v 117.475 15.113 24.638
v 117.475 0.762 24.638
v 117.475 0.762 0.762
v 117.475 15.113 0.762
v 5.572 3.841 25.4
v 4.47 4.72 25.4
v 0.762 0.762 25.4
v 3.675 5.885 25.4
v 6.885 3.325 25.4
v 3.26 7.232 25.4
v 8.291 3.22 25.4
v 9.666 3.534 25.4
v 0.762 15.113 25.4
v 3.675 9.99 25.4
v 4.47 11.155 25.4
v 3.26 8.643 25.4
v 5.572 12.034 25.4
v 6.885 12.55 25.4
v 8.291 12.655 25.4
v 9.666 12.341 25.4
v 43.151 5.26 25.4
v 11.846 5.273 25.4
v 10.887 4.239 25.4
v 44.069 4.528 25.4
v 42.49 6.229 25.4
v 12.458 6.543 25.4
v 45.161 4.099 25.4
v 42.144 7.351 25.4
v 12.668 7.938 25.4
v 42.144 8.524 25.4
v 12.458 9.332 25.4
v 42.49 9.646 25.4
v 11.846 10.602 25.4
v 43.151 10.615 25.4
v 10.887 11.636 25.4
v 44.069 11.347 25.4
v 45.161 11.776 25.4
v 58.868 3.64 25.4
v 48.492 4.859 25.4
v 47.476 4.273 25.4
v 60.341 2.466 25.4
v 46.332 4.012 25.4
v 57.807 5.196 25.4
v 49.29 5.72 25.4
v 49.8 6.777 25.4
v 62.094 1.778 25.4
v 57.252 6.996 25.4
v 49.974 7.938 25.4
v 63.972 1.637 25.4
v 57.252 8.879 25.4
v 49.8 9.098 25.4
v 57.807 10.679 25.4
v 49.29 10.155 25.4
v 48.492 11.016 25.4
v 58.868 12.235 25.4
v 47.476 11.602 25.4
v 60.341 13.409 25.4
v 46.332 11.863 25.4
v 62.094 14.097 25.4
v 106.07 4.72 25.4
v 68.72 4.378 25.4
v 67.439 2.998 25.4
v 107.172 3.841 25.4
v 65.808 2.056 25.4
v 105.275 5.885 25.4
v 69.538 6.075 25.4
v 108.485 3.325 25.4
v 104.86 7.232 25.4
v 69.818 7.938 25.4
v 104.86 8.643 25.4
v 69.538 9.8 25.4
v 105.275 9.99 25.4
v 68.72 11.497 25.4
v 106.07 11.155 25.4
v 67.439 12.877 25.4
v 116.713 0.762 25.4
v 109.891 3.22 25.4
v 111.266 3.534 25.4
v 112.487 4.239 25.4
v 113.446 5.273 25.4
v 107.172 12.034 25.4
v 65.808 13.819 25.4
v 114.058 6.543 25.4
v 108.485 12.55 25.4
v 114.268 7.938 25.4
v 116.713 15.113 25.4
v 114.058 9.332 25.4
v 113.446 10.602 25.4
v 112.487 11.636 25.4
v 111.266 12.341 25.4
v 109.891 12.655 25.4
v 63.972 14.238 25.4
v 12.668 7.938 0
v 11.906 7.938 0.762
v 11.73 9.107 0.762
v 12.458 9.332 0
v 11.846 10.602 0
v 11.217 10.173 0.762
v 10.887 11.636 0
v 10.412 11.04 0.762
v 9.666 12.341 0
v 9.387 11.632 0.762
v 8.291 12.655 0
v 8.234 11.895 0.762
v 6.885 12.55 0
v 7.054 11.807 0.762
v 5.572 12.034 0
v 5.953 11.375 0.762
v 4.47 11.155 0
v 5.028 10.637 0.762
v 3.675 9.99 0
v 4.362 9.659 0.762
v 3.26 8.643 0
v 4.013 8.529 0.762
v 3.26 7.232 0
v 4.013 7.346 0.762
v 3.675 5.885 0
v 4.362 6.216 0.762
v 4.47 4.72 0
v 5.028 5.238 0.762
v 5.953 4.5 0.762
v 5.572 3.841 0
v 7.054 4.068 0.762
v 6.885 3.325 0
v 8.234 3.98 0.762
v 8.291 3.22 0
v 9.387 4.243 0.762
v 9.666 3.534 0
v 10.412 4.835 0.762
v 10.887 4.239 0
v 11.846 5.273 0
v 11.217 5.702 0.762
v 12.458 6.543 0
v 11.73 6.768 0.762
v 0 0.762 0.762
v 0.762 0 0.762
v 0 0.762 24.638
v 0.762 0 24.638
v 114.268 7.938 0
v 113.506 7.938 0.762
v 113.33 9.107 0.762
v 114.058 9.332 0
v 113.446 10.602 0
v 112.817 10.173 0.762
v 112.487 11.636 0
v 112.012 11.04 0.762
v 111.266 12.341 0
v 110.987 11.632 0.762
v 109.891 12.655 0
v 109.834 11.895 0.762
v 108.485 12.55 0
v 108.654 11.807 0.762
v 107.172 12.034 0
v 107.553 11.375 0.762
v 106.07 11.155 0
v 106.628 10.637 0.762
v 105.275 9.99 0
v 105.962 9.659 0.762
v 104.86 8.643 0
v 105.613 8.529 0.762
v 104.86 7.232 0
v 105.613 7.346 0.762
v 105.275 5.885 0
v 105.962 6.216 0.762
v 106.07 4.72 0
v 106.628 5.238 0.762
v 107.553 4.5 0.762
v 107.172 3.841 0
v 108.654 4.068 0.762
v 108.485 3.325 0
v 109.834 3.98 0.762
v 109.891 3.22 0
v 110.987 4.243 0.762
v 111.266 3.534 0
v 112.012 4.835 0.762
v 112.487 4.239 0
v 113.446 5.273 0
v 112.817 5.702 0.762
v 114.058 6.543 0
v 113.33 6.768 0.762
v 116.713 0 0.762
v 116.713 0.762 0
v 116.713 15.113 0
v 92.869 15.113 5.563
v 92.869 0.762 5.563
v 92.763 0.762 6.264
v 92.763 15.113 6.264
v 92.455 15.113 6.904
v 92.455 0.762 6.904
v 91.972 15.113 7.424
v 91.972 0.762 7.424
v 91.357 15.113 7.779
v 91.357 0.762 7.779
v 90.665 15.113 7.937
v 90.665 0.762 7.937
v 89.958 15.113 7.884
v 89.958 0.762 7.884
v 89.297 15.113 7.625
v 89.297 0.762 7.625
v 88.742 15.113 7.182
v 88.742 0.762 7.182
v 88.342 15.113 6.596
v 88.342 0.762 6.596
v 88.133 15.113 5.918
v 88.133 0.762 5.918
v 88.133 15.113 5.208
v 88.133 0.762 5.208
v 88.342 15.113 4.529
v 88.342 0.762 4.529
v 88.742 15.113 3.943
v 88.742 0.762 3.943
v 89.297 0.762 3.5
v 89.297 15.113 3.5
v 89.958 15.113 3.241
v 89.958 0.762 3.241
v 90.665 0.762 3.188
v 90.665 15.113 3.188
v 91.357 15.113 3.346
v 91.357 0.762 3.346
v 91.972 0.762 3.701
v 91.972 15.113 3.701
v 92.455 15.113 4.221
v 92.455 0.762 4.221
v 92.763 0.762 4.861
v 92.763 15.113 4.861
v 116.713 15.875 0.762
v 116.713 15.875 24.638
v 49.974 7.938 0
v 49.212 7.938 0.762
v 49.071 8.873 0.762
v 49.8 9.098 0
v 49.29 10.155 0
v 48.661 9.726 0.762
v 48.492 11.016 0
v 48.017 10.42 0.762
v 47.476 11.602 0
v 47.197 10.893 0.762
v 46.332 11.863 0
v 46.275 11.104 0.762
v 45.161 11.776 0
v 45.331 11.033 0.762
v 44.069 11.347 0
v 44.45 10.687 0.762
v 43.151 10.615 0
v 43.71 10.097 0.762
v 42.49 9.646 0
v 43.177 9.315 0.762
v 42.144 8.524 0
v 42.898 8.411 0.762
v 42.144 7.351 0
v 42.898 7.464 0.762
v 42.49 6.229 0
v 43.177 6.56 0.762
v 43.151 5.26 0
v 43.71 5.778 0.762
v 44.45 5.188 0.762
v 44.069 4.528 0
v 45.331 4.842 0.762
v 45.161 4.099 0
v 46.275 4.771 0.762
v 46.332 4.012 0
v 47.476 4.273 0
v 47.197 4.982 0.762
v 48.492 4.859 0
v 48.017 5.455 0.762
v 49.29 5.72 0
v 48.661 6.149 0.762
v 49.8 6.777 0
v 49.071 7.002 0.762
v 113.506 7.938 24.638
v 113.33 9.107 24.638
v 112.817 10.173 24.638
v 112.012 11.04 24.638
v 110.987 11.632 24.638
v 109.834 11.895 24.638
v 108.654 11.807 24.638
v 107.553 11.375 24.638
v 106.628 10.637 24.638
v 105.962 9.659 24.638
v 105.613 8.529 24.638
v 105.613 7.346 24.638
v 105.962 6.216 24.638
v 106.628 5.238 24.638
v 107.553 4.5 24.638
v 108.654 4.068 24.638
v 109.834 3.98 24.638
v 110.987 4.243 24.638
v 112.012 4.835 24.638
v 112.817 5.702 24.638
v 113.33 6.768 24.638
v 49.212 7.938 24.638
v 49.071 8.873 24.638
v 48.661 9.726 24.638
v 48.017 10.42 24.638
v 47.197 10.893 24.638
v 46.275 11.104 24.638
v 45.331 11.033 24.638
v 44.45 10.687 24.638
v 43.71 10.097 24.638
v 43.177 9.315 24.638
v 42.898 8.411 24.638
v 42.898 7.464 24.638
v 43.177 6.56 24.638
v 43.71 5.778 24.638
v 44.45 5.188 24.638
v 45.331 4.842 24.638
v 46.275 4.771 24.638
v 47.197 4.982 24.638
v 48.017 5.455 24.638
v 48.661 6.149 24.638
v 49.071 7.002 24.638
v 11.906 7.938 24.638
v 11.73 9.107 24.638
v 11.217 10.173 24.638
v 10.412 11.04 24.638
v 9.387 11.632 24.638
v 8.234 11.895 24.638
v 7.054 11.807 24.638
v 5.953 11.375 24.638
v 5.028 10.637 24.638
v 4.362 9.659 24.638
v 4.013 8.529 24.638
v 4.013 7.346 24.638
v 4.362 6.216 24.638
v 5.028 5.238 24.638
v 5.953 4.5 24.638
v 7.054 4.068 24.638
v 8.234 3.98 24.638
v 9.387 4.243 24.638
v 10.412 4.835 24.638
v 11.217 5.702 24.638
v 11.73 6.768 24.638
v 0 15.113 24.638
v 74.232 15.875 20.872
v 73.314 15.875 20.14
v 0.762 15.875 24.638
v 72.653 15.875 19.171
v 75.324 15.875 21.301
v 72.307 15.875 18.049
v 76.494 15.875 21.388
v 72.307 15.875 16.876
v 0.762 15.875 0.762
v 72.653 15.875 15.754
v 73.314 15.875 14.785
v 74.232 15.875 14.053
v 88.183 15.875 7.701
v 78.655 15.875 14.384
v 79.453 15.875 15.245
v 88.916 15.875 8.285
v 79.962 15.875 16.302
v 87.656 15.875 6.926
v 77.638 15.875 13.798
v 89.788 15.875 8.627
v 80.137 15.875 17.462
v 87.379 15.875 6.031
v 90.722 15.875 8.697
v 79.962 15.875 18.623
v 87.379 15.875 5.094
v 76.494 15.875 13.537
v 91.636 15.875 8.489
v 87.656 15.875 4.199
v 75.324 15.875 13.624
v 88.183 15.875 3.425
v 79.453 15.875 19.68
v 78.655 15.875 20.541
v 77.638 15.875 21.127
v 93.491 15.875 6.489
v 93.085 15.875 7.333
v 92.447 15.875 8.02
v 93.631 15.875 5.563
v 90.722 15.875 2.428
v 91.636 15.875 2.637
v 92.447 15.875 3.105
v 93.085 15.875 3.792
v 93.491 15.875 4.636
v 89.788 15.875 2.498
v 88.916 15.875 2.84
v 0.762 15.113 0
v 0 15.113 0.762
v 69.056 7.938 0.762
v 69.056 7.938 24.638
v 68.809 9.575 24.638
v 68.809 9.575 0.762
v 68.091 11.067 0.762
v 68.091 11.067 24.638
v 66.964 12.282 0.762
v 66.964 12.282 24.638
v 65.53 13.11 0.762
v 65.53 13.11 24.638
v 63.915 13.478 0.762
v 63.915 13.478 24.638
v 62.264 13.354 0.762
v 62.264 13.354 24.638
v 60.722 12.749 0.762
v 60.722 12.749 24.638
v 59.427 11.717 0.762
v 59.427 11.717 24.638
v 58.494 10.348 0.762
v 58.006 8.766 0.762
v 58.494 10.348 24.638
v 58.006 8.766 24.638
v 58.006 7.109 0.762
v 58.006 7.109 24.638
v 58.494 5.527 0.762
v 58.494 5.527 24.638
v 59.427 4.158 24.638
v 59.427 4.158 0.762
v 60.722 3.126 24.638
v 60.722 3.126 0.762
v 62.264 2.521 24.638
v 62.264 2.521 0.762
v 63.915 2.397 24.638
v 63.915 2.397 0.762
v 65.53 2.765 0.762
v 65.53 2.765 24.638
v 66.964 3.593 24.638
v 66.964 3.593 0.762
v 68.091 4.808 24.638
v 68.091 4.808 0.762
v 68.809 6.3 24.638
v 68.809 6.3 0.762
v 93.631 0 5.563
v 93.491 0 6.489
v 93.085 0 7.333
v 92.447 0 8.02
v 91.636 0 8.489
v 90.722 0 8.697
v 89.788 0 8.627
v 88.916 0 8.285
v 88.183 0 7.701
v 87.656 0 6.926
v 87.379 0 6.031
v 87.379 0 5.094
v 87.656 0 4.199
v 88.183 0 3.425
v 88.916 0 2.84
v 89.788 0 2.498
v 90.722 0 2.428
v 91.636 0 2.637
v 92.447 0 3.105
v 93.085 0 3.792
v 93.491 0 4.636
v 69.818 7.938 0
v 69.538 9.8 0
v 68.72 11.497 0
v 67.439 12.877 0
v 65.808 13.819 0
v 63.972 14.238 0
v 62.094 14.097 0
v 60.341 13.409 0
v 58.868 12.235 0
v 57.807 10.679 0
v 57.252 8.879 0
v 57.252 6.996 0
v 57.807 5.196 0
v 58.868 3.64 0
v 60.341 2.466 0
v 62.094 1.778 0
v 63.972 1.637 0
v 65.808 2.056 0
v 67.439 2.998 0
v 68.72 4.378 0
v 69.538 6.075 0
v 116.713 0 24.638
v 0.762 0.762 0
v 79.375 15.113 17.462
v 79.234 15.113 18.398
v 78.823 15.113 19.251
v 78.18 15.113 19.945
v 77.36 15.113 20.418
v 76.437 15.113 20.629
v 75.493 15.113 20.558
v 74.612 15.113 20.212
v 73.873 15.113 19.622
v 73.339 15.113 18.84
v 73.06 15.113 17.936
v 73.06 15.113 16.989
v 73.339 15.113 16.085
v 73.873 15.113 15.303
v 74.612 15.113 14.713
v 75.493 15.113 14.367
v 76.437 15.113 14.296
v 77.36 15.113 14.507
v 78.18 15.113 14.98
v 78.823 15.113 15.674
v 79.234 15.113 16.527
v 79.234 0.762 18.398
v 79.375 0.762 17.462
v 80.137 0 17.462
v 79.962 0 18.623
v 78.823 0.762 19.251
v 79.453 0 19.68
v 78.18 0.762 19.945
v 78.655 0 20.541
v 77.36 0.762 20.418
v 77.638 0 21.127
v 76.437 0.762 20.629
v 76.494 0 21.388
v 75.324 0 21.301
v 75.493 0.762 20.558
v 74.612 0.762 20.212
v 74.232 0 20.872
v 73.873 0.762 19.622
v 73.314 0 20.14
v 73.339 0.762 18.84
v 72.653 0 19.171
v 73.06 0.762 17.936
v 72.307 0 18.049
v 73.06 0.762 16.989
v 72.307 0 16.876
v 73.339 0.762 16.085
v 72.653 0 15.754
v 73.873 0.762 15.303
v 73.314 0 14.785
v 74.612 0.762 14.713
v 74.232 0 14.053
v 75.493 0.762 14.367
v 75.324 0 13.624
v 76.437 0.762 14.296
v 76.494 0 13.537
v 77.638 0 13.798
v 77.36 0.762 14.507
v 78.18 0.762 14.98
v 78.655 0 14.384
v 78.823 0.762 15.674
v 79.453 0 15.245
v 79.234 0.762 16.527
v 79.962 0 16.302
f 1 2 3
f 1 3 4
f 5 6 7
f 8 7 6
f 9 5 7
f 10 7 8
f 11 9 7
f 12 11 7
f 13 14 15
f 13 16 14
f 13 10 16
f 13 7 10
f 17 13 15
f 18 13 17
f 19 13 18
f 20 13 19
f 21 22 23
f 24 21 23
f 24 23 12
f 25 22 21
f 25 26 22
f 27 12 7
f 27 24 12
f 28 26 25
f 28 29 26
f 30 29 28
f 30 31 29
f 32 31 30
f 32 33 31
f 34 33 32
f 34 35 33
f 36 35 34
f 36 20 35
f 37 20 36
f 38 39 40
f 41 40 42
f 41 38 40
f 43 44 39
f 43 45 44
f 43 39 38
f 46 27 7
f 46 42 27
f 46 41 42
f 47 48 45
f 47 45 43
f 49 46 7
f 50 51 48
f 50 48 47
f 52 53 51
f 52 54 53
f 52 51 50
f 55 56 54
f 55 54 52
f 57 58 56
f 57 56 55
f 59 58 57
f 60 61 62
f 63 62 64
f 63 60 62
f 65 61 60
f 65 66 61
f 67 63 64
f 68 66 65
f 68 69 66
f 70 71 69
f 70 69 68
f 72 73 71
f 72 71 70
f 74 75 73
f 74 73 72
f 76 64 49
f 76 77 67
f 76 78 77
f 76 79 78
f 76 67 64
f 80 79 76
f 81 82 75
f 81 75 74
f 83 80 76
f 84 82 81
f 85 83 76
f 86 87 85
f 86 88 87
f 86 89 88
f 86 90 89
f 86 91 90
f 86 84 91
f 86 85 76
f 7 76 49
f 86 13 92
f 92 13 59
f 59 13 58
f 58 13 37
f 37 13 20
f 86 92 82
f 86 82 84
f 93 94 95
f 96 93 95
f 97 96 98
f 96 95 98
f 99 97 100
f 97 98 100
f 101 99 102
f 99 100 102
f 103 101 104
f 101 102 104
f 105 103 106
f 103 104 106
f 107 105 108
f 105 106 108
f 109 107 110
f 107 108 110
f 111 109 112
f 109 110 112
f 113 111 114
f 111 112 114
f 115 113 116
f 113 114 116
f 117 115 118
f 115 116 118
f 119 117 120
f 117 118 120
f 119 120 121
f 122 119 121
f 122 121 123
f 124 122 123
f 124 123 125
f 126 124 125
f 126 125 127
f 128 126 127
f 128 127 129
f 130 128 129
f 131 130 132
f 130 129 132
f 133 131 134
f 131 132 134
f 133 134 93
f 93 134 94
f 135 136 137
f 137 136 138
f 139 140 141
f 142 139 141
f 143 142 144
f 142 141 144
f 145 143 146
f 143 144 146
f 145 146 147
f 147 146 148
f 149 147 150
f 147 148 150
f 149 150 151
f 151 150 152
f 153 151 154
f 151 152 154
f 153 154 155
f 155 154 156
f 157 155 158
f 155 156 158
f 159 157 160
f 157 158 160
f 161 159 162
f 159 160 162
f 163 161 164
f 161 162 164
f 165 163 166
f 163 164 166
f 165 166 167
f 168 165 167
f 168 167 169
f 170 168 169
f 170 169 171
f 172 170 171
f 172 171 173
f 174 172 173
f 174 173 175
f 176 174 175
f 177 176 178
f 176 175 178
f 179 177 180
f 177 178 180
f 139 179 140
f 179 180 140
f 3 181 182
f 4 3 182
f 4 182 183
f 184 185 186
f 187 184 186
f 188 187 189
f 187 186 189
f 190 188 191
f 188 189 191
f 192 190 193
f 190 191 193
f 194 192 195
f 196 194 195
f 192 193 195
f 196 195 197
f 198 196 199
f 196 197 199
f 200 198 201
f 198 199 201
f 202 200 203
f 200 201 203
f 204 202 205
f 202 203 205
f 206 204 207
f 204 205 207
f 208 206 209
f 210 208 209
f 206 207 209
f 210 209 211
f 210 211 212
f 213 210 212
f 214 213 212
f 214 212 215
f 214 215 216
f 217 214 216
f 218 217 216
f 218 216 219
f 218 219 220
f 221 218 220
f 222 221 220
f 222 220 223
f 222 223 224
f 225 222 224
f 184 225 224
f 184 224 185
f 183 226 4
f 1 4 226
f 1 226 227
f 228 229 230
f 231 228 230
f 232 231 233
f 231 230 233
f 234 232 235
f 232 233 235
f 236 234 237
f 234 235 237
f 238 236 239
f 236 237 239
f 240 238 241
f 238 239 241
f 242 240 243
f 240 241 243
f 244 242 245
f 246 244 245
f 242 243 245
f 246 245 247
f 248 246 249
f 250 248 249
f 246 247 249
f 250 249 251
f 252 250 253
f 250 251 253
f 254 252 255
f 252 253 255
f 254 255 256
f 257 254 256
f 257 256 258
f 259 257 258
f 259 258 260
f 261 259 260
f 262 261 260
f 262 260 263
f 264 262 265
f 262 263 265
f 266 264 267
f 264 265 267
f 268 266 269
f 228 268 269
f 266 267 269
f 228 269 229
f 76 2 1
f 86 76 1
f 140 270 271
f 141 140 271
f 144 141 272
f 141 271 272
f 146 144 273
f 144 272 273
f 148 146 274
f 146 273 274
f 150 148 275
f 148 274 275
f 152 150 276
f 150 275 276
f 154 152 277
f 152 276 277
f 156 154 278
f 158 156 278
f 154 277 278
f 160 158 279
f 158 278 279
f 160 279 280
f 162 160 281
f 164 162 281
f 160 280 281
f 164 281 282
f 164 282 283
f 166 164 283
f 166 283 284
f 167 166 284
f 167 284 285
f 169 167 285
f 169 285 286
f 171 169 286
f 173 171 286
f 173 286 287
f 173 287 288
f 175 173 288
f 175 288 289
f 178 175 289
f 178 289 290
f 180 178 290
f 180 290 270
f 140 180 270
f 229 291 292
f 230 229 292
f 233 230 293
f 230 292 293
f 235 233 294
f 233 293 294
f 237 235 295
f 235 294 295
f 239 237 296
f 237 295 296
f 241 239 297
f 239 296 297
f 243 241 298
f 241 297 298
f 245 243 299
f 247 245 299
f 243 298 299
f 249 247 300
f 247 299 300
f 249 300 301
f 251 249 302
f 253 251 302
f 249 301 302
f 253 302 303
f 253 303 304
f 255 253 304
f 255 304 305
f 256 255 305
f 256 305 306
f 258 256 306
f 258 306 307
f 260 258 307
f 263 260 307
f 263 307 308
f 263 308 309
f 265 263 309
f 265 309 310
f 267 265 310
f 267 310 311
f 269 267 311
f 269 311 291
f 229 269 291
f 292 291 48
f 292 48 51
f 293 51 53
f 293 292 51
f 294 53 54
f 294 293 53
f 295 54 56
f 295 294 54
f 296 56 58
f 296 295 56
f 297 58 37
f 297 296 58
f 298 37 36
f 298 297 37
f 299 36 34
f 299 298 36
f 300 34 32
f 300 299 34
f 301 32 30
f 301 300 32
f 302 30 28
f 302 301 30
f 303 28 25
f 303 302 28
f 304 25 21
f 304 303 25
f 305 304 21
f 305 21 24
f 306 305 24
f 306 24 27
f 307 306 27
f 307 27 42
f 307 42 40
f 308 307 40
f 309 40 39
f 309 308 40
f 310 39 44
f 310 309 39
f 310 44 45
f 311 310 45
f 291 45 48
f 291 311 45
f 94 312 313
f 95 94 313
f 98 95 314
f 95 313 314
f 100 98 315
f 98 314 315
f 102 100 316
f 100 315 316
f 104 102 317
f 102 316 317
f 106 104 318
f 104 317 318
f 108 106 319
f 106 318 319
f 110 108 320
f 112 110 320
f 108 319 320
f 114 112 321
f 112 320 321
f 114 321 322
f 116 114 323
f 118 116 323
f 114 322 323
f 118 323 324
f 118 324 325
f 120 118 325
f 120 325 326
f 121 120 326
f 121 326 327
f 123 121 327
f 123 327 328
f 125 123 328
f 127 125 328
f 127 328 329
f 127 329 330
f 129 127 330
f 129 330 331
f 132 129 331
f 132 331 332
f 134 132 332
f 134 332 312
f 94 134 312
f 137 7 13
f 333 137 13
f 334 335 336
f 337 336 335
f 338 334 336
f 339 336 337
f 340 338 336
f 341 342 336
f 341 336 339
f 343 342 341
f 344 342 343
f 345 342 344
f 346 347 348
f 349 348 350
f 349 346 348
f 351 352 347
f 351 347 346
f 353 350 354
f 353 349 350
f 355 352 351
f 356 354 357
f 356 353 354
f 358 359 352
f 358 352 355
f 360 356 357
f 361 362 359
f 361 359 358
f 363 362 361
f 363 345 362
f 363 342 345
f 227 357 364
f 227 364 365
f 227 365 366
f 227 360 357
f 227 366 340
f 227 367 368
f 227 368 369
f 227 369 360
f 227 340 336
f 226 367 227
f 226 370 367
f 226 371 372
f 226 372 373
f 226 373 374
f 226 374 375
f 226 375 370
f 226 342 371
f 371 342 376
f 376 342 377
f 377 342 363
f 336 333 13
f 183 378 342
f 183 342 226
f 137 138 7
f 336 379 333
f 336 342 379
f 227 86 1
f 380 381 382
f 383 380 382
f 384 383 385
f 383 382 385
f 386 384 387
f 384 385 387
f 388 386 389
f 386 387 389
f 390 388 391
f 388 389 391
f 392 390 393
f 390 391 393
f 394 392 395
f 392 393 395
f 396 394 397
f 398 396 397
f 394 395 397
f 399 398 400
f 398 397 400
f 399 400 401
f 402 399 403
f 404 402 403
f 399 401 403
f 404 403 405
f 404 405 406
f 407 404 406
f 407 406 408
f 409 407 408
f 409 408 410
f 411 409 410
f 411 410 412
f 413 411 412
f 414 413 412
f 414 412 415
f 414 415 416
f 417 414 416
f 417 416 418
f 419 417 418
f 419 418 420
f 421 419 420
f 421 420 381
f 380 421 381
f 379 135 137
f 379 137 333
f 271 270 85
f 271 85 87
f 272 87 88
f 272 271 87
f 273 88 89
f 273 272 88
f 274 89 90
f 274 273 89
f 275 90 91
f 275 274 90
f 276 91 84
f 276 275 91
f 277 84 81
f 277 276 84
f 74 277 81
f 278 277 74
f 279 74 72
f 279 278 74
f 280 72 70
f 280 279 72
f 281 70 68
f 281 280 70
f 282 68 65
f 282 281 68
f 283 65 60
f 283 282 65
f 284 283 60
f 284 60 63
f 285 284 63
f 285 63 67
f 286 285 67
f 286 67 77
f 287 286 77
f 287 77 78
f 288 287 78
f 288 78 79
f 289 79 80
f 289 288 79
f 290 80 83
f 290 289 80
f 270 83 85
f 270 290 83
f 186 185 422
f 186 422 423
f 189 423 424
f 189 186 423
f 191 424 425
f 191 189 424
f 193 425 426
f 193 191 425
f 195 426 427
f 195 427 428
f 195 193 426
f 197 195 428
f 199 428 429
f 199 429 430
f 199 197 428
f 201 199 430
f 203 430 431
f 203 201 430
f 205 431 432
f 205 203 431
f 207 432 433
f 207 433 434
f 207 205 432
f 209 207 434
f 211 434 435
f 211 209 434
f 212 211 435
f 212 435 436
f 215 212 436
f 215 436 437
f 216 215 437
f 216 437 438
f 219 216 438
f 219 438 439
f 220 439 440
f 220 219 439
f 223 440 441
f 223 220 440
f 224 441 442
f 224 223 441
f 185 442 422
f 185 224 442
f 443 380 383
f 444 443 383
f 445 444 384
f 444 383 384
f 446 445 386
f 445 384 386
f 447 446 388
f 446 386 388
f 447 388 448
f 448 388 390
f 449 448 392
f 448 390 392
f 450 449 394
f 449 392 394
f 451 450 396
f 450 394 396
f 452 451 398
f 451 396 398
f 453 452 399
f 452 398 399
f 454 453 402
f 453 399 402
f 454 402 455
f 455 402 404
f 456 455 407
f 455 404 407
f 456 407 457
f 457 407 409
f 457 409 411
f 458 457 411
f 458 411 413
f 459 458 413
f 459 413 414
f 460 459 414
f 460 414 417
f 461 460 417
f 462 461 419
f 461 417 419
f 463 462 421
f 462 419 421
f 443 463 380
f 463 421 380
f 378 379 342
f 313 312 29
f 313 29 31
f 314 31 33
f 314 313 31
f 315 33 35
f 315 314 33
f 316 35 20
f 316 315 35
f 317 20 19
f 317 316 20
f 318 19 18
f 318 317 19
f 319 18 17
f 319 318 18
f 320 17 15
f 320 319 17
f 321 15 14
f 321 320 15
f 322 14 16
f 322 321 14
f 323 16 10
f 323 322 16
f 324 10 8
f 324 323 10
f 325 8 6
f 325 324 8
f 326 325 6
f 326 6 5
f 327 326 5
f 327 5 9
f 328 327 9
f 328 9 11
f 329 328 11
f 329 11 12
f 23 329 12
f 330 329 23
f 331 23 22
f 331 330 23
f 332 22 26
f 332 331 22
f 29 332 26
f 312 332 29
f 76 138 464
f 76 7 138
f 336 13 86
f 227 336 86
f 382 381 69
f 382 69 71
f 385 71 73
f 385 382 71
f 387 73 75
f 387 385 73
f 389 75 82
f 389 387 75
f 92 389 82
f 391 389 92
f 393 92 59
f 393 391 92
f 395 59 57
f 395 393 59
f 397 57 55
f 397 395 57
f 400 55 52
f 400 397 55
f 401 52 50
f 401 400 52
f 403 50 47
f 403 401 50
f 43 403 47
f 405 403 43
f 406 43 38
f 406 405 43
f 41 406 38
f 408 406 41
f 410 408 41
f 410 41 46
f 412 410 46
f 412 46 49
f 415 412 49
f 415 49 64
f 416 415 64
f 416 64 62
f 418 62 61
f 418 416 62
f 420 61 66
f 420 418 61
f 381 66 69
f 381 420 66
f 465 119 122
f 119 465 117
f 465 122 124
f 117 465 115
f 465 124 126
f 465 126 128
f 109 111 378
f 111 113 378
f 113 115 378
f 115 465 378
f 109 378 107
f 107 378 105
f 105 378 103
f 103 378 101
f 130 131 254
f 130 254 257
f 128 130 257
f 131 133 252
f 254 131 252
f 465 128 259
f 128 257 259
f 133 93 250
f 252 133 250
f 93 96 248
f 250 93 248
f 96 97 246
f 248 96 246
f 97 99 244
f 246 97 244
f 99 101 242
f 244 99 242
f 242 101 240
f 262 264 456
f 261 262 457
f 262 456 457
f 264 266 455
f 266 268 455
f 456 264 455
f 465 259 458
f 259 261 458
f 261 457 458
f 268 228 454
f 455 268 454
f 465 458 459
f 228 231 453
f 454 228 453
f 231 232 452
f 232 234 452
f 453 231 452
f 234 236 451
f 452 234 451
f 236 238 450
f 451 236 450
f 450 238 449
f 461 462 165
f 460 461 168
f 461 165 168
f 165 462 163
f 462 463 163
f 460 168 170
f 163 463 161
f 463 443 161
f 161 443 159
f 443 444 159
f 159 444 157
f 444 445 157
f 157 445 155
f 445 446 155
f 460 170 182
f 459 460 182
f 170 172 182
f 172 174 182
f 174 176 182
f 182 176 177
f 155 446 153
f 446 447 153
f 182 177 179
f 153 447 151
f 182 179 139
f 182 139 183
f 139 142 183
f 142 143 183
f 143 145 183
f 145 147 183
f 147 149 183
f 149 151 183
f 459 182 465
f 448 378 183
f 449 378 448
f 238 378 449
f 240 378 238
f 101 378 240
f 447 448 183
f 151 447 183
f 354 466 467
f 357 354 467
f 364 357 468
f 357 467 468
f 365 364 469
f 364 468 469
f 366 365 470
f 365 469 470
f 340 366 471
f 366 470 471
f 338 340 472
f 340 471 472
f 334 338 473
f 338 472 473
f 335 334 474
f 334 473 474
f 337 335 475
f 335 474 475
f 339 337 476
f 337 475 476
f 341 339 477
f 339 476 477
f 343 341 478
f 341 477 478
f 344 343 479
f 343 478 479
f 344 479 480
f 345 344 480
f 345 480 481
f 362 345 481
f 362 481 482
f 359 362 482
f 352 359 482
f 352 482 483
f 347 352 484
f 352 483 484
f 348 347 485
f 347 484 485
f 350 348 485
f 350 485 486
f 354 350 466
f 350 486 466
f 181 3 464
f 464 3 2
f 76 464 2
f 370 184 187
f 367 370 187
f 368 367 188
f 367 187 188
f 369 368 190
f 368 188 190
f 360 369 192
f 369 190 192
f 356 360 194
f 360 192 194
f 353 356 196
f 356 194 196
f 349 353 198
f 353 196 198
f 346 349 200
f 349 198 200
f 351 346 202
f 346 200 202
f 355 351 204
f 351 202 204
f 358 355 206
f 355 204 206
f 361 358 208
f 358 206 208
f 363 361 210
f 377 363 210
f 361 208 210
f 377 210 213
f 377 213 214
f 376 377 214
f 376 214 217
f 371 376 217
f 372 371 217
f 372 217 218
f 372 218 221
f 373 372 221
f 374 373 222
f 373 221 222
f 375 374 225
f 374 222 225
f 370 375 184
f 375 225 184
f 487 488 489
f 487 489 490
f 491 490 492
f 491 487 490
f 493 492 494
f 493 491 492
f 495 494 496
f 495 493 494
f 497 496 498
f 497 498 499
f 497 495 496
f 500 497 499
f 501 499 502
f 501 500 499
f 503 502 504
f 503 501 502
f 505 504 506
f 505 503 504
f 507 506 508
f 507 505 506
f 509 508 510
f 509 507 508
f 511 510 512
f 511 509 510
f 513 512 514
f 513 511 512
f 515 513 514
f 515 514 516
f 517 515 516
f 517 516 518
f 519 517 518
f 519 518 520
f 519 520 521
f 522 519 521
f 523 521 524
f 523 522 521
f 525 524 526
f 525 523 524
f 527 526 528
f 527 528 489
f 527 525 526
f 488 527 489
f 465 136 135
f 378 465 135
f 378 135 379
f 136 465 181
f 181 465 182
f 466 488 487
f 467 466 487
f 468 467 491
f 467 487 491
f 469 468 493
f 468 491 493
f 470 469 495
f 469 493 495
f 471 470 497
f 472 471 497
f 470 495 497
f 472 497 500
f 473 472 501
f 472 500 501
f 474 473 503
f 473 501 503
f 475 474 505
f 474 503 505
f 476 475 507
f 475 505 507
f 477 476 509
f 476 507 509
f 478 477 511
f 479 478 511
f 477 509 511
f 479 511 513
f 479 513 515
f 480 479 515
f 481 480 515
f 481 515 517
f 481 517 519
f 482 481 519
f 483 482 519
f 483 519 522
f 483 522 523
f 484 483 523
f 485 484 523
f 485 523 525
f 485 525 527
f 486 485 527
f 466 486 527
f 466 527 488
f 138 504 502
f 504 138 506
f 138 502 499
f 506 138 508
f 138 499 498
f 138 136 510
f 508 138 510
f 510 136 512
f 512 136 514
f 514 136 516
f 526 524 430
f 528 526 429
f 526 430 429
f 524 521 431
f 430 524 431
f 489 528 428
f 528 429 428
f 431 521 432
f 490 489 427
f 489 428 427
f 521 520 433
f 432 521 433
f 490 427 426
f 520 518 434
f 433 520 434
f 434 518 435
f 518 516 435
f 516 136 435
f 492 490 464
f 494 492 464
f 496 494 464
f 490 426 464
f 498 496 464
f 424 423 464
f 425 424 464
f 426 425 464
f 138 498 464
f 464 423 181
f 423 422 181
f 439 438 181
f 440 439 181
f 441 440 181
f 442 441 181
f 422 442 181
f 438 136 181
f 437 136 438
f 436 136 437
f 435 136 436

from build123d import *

# Parameters (mm, degrees)
F0_W     = 117.475
F0_H     = 15.875
F1_DEPTH = 25.4
F2_R     = 3.96875
F2_R_2   = 3.175
F2_R_3   = 5.55625
F3_DEPTH = 25.401
F4_R     = 3.175
F4_R_2   = 2.38125
F5_DEPTH = 15.876
F6_SIZE  = 0.762


with BuildPart() as f1:
    # F0 (on Top) → F1 (new body)
    with BuildSketch(Plane.XY):
        with Locations((58.7375, 7.9375)):
            Rectangle(F0_W, F0_H)
    extrude(amount=F1_DEPTH)

    # F2 (on face) → F3 (cut, through all)
    with BuildSketch(Plane.XY.offset(25.4)):
        with Locations((7.9375, 7.9375)):
            Circle(F2_R)
        with Locations((46.0375, 7.9375)):
            Circle(F2_R_2)
        with Locations((63.5, 7.9375)):
            Circle(F2_R_3)
        with Locations((109.5375, 7.9375)):
            Circle(F2_R)
    extrude(amount=-F3_DEPTH, mode=Mode.SUBTRACT)

    # F4 (on face) → F5 (cut, through all)
    with BuildSketch(Plane.XZ):
        with Locations((76.2, 17.4625)):
            Circle(F4_R)
        with Locations((90.4875, 5.5626)):
            Circle(F4_R_2)
    extrude(amount=-F5_DEPTH, mode=Mode.SUBTRACT)

    # F6
    f6_edges = [f1.edges().sort_by_distance(p)[0] for p in [
        (73.025, 0, 17.4625),
        (88.10625, 0, 5.5626),
        (57.94375, 7.9375, 25.4),
        (42.8625, 7.9375, 25.4),
        (105.56875, 7.9375, 25.4),
        (58.7375, 0, 25.4),
        (58.7375, 0, 0),
        (117.475, 0, 12.7),
        (0, 0, 12.7),
        (0, 7.9375, 25.4),
        (0, 15.875, 12.7),
        (0, 7.9375, 0),
        (58.7375, 15.875, 0),
        (3.96875, 7.9375, 0),
        (42.8625, 7.9375, 0),
        (57.94375, 7.9375, 0),
        (58.7375, 15.875, 25.4),
        (73.025, 15.875, 17.4625),
        (88.10625, 15.875, 5.5626),
        (3.96875, 7.9375, 25.4),
        (117.475, 7.9375, 25.4),
        (117.475, 15.875, 12.7),
        (117.475, 7.9375, 0),
        (105.56875, 7.9375, 0),
    ]]
    chamfer(f6_edges, length=F6_SIZE)


solid = f1.part
